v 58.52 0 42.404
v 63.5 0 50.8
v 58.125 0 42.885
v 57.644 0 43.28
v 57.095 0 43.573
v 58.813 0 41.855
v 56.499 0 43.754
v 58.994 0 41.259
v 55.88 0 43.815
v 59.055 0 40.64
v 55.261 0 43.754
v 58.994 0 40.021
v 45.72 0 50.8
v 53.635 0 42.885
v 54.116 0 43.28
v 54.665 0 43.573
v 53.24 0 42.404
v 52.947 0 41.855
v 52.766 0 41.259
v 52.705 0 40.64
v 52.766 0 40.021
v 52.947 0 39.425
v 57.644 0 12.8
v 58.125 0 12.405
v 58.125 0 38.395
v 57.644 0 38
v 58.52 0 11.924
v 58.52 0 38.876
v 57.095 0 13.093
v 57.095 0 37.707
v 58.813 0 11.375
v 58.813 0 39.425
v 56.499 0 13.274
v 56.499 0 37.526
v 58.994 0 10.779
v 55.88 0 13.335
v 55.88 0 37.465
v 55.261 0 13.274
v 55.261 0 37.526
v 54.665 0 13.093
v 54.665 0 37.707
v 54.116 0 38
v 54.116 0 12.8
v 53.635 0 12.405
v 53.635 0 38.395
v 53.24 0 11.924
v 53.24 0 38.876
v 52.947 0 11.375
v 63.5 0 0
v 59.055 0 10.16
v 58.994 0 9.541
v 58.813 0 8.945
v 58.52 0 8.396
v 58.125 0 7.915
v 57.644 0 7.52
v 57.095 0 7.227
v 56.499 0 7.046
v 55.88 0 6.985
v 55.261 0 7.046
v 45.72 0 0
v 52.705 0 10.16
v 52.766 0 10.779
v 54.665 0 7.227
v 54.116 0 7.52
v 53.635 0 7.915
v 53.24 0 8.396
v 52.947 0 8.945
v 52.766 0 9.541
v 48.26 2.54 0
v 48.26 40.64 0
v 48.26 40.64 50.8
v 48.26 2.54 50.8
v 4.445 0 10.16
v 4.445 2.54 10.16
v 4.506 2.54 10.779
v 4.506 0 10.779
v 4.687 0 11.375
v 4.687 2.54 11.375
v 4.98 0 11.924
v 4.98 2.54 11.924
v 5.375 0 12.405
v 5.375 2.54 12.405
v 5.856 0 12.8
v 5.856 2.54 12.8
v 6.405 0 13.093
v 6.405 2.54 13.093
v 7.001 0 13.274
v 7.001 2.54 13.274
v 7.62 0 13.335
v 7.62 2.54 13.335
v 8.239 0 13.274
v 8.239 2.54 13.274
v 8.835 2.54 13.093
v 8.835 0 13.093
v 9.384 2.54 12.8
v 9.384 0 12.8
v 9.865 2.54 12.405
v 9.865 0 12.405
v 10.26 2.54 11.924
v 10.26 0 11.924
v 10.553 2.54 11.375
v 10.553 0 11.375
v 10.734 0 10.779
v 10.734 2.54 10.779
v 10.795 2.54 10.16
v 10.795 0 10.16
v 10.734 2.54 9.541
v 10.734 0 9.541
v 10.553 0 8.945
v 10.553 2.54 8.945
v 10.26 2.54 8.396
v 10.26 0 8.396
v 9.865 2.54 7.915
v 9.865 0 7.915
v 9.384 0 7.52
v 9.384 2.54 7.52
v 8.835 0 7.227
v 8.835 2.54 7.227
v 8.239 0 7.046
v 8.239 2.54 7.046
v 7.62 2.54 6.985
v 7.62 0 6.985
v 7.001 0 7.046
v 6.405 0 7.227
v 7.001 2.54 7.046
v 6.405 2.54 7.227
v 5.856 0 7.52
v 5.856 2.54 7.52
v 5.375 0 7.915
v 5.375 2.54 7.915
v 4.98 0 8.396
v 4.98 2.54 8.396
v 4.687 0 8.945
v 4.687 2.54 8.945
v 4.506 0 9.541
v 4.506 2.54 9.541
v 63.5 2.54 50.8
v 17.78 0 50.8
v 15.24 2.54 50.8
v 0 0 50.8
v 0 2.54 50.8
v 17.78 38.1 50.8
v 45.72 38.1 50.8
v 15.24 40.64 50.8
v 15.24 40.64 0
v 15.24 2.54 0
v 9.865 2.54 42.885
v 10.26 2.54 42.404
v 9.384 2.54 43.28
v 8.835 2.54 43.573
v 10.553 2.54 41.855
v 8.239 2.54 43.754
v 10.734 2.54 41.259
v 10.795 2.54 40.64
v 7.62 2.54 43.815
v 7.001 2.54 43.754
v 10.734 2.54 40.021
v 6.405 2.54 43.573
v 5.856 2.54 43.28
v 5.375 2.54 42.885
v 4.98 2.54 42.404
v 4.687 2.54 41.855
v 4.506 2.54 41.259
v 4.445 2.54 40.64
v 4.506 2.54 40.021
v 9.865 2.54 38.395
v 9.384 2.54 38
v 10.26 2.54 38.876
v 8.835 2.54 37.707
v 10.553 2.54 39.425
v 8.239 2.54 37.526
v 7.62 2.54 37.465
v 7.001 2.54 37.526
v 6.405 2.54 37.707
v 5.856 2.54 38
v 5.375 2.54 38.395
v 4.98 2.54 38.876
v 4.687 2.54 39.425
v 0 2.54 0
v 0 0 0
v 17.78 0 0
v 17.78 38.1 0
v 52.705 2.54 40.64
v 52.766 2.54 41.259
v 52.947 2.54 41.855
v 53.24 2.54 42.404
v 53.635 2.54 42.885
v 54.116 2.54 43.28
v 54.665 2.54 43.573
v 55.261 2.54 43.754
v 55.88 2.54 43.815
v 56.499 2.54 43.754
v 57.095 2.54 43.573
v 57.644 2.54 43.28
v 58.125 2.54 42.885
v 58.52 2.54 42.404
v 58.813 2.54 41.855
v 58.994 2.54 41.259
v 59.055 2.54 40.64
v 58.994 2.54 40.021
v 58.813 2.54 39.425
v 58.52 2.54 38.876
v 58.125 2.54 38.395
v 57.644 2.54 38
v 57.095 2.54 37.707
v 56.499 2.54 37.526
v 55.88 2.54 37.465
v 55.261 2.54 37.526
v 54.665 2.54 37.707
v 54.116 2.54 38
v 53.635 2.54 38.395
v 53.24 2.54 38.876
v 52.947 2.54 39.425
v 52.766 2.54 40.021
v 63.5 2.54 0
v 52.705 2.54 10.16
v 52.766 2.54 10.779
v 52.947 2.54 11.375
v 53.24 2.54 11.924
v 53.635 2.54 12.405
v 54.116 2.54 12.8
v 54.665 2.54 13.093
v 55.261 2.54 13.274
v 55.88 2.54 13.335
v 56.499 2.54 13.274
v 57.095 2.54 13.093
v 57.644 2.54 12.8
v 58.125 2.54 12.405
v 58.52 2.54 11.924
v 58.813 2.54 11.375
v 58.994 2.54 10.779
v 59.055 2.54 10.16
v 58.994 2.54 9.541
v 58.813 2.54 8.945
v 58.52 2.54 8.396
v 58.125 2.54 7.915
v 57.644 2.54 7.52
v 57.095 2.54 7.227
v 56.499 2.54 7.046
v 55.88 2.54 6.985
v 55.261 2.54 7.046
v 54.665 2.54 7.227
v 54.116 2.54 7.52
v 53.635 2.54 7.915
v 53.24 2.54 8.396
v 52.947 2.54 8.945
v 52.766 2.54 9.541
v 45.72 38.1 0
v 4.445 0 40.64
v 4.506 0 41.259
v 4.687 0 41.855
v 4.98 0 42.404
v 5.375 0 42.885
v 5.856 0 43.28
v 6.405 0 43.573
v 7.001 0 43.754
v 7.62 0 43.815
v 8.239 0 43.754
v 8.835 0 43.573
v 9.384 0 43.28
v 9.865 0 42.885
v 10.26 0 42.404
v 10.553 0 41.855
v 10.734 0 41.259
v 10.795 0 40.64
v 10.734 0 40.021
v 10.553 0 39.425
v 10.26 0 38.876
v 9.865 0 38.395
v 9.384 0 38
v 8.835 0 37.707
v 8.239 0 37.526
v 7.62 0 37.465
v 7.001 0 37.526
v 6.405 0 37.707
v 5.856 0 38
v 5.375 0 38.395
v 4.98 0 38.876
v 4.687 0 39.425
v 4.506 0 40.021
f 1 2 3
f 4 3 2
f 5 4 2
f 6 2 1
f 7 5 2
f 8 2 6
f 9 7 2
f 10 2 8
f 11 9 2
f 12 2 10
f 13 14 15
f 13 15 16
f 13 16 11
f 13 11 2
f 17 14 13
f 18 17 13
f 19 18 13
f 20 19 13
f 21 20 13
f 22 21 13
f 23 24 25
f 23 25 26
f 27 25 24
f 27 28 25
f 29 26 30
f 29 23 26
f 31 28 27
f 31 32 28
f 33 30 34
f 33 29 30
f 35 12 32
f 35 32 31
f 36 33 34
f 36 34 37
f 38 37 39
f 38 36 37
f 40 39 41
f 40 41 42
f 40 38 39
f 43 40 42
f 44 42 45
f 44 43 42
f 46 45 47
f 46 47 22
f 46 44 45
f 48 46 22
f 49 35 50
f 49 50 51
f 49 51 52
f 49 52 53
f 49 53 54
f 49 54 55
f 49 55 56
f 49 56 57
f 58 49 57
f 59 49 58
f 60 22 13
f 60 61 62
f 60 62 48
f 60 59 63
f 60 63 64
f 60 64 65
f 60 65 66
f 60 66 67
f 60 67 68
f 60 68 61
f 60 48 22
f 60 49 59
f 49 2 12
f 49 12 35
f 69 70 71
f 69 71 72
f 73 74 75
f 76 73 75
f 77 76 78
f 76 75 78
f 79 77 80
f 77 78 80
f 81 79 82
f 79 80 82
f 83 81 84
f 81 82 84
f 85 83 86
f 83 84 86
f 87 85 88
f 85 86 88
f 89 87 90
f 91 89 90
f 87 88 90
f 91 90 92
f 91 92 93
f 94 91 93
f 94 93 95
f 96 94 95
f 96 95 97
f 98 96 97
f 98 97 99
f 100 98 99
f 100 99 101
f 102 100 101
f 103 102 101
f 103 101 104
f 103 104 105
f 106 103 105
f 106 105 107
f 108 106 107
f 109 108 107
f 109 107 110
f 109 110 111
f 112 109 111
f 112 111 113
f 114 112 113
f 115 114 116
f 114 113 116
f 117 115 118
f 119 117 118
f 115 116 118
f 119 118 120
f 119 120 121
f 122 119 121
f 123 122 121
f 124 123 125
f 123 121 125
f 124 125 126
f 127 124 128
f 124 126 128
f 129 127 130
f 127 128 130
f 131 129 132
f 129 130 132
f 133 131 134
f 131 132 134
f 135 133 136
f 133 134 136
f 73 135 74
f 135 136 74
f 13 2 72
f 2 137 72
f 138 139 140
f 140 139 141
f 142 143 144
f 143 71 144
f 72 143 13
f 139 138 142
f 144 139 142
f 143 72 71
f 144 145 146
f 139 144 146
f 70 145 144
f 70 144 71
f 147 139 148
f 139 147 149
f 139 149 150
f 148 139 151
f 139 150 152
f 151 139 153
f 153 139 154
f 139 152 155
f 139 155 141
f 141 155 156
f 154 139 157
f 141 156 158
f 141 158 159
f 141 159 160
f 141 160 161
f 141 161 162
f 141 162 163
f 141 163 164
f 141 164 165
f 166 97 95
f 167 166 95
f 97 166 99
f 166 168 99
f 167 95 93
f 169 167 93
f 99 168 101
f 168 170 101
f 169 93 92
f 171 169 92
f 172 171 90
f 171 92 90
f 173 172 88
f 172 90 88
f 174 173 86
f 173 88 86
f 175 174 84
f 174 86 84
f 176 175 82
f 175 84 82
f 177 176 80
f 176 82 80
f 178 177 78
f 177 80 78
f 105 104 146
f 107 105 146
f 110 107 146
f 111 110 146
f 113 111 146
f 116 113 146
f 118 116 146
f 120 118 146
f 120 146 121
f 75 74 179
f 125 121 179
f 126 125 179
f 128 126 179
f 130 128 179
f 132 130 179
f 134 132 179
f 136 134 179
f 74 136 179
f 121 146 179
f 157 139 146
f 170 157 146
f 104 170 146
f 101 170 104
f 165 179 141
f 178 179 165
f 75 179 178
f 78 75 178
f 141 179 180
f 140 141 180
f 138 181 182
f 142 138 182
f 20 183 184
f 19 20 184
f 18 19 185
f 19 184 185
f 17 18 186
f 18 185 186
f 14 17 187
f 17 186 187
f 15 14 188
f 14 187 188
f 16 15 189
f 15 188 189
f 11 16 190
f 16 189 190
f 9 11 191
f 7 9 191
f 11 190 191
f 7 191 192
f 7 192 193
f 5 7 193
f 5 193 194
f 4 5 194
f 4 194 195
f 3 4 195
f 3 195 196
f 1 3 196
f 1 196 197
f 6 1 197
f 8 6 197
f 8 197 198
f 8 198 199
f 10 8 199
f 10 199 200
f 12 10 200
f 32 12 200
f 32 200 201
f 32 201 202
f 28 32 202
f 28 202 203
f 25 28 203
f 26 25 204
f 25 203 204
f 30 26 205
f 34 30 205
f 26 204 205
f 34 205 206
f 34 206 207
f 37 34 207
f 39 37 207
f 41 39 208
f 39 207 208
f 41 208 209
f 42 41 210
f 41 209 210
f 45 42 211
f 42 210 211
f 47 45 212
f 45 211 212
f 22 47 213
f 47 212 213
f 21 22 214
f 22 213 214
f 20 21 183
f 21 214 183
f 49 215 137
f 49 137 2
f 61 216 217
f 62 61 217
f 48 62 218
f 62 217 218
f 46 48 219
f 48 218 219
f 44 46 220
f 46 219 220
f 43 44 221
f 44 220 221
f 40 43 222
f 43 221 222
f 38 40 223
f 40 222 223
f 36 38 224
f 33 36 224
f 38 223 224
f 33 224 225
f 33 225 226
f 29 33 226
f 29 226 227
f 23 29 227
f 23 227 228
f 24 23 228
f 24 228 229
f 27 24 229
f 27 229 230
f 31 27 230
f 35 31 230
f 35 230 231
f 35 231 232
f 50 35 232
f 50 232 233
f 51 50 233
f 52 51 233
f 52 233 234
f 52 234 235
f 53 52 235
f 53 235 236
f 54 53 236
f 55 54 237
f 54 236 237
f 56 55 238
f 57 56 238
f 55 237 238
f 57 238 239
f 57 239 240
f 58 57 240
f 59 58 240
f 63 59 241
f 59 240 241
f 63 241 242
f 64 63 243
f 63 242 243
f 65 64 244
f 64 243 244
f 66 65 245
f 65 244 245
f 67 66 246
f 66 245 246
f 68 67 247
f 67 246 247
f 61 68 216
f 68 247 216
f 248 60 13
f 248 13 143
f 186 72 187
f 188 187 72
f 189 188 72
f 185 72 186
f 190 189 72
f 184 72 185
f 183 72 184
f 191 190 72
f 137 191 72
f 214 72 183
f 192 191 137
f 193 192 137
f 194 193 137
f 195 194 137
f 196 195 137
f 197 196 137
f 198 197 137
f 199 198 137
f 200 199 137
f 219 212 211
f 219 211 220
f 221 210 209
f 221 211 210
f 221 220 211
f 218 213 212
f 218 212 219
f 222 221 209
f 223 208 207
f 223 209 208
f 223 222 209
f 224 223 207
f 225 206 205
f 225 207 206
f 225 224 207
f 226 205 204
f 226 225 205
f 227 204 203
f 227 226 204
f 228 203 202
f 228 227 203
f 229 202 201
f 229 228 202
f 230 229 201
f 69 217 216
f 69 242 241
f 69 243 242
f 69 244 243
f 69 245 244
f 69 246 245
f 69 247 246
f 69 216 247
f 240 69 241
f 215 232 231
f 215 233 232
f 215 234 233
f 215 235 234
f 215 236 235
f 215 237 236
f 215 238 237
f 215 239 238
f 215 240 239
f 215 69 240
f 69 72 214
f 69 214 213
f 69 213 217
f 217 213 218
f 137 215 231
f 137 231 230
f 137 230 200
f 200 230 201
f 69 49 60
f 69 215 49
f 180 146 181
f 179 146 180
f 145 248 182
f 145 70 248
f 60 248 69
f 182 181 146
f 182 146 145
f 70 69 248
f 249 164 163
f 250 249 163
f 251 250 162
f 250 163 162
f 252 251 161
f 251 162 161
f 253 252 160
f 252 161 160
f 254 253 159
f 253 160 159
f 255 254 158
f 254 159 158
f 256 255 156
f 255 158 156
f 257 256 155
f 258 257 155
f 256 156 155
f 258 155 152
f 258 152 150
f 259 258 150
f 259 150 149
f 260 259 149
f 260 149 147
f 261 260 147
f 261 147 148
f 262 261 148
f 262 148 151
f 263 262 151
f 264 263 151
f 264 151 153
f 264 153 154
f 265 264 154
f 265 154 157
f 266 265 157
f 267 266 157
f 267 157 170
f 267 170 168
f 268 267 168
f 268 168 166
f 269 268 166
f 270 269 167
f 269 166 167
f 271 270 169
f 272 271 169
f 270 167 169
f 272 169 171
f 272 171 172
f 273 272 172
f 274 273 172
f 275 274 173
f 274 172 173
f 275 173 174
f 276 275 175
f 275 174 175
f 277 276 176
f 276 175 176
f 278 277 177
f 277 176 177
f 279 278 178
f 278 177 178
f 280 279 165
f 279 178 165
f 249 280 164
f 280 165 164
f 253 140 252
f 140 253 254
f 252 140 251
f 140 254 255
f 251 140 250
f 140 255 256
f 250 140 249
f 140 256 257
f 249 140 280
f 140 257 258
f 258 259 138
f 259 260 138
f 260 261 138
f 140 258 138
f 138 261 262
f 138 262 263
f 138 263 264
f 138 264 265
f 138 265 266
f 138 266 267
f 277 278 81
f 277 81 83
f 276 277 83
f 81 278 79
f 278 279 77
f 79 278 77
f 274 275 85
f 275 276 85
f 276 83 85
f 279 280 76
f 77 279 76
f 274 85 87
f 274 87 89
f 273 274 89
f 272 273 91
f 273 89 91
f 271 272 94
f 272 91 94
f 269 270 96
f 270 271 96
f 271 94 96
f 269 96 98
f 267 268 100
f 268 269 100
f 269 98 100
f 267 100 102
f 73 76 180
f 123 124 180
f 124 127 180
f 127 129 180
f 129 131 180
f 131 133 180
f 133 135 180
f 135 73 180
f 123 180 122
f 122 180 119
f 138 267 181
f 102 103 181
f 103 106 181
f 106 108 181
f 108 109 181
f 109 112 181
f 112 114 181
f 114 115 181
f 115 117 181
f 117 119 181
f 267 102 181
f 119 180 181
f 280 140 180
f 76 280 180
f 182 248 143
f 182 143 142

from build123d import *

# Parameters (mm, degrees)
BOSS_EXTRUDE3_DEPTH = 50.8
CUT_EXTRUDE1_REACH  = 4.54
SKETCH6_R           = 3.175


with BuildPart() as part:
    # Sketch5 → Boss-Extrude3 (new body)
    with BuildSketch(Plane.XY):
        Polygon((0, 0), (17.78, 0), (17.78, 38.1), (31.75, 38.1), (31.75, 40.64), (15.24, 40.64), (15.24, 2.54), (0, 2.54), align=None)
    boss_extrude3 = extrude(amount=BOSS_EXTRUDE3_DEPTH)

    # Mirror6: Boss-Extrude3 across plane
    add(boss_extrude3.mirror(Plane(origin=(31.75, 40.64, 50.8), x_dir=(0, 0, 1), z_dir=(-1, 0, 0))))

    # Sketch6 → Cut-Extrude1 (cut, up to next)
    with BuildSketch(Plane(origin=(0, 2.54, 0), x_dir=(-1, 0, 0), z_dir=(0, 1, 0)), mode=Mode.PRIVATE) as cut_extrude1_sk1:
        with Locations((-7.62, 40.64)):
            Circle(SKETCH6_R)
    cut_extrude1_tool1 = extrude(cut_extrude1_sk1.sketch, amount=-CUT_EXTRUDE1_REACH, mode=Mode.PRIVATE) & part.part
    add(cut_extrude1_tool1.solids().sort_by_distance((7.62, 2.54, 40.64))[0], mode=Mode.SUBTRACT)
    # Sketch6 → Cut-Extrude1 (cut, up to next)
    with BuildSketch(Plane(origin=(0, 2.54, 0), x_dir=(-1, 0, 0), z_dir=(0, 1, 0)), mode=Mode.PRIVATE) as cut_extrude1_sk2:
        with Locations((-7.62, 10.16)):
            Circle(SKETCH6_R)
    cut_extrude1_tool2 = extrude(cut_extrude1_sk2.sketch, amount=-CUT_EXTRUDE1_REACH, mode=Mode.PRIVATE) & part.part
    add(cut_extrude1_tool2.solids().sort_by_distance((7.62, 2.54, 10.16))[0], mode=Mode.SUBTRACT)
    # Sketch6 → Cut-Extrude1 (cut, up to next)
    with BuildSketch(Plane(origin=(0, 2.54, 0), x_dir=(-1, 0, 0), z_dir=(0, 1, 0)), mode=Mode.PRIVATE) as cut_extrude1_sk3:
        with Locations((-55.88, 10.16)):
            Circle(SKETCH6_R)
    cut_extrude1_tool3 = extrude(cut_extrude1_sk3.sketch, amount=-CUT_EXTRUDE1_REACH, mode=Mode.PRIVATE) & part.part
    add(cut_extrude1_tool3.solids().sort_by_distance((55.88, 2.54, 10.16))[0], mode=Mode.SUBTRACT)
    # Sketch6 → Cut-Extrude1 (cut, up to next)
    with BuildSketch(Plane(origin=(0, 2.54, 0), x_dir=(-1, 0, 0), z_dir=(0, 1, 0)), mode=Mode.PRIVATE) as cut_extrude1_sk4:
        with Locations((-55.88, 40.64)):
            Circle(SKETCH6_R)
    cut_extrude1_tool4 = extrude(cut_extrude1_sk4.sketch, amount=-CUT_EXTRUDE1_REACH, mode=Mode.PRIVATE) & part.part
    add(cut_extrude1_tool4.solids().sort_by_distance((55.88, 2.54, 40.64))[0], mode=Mode.SUBTRACT)


solid = part.part
